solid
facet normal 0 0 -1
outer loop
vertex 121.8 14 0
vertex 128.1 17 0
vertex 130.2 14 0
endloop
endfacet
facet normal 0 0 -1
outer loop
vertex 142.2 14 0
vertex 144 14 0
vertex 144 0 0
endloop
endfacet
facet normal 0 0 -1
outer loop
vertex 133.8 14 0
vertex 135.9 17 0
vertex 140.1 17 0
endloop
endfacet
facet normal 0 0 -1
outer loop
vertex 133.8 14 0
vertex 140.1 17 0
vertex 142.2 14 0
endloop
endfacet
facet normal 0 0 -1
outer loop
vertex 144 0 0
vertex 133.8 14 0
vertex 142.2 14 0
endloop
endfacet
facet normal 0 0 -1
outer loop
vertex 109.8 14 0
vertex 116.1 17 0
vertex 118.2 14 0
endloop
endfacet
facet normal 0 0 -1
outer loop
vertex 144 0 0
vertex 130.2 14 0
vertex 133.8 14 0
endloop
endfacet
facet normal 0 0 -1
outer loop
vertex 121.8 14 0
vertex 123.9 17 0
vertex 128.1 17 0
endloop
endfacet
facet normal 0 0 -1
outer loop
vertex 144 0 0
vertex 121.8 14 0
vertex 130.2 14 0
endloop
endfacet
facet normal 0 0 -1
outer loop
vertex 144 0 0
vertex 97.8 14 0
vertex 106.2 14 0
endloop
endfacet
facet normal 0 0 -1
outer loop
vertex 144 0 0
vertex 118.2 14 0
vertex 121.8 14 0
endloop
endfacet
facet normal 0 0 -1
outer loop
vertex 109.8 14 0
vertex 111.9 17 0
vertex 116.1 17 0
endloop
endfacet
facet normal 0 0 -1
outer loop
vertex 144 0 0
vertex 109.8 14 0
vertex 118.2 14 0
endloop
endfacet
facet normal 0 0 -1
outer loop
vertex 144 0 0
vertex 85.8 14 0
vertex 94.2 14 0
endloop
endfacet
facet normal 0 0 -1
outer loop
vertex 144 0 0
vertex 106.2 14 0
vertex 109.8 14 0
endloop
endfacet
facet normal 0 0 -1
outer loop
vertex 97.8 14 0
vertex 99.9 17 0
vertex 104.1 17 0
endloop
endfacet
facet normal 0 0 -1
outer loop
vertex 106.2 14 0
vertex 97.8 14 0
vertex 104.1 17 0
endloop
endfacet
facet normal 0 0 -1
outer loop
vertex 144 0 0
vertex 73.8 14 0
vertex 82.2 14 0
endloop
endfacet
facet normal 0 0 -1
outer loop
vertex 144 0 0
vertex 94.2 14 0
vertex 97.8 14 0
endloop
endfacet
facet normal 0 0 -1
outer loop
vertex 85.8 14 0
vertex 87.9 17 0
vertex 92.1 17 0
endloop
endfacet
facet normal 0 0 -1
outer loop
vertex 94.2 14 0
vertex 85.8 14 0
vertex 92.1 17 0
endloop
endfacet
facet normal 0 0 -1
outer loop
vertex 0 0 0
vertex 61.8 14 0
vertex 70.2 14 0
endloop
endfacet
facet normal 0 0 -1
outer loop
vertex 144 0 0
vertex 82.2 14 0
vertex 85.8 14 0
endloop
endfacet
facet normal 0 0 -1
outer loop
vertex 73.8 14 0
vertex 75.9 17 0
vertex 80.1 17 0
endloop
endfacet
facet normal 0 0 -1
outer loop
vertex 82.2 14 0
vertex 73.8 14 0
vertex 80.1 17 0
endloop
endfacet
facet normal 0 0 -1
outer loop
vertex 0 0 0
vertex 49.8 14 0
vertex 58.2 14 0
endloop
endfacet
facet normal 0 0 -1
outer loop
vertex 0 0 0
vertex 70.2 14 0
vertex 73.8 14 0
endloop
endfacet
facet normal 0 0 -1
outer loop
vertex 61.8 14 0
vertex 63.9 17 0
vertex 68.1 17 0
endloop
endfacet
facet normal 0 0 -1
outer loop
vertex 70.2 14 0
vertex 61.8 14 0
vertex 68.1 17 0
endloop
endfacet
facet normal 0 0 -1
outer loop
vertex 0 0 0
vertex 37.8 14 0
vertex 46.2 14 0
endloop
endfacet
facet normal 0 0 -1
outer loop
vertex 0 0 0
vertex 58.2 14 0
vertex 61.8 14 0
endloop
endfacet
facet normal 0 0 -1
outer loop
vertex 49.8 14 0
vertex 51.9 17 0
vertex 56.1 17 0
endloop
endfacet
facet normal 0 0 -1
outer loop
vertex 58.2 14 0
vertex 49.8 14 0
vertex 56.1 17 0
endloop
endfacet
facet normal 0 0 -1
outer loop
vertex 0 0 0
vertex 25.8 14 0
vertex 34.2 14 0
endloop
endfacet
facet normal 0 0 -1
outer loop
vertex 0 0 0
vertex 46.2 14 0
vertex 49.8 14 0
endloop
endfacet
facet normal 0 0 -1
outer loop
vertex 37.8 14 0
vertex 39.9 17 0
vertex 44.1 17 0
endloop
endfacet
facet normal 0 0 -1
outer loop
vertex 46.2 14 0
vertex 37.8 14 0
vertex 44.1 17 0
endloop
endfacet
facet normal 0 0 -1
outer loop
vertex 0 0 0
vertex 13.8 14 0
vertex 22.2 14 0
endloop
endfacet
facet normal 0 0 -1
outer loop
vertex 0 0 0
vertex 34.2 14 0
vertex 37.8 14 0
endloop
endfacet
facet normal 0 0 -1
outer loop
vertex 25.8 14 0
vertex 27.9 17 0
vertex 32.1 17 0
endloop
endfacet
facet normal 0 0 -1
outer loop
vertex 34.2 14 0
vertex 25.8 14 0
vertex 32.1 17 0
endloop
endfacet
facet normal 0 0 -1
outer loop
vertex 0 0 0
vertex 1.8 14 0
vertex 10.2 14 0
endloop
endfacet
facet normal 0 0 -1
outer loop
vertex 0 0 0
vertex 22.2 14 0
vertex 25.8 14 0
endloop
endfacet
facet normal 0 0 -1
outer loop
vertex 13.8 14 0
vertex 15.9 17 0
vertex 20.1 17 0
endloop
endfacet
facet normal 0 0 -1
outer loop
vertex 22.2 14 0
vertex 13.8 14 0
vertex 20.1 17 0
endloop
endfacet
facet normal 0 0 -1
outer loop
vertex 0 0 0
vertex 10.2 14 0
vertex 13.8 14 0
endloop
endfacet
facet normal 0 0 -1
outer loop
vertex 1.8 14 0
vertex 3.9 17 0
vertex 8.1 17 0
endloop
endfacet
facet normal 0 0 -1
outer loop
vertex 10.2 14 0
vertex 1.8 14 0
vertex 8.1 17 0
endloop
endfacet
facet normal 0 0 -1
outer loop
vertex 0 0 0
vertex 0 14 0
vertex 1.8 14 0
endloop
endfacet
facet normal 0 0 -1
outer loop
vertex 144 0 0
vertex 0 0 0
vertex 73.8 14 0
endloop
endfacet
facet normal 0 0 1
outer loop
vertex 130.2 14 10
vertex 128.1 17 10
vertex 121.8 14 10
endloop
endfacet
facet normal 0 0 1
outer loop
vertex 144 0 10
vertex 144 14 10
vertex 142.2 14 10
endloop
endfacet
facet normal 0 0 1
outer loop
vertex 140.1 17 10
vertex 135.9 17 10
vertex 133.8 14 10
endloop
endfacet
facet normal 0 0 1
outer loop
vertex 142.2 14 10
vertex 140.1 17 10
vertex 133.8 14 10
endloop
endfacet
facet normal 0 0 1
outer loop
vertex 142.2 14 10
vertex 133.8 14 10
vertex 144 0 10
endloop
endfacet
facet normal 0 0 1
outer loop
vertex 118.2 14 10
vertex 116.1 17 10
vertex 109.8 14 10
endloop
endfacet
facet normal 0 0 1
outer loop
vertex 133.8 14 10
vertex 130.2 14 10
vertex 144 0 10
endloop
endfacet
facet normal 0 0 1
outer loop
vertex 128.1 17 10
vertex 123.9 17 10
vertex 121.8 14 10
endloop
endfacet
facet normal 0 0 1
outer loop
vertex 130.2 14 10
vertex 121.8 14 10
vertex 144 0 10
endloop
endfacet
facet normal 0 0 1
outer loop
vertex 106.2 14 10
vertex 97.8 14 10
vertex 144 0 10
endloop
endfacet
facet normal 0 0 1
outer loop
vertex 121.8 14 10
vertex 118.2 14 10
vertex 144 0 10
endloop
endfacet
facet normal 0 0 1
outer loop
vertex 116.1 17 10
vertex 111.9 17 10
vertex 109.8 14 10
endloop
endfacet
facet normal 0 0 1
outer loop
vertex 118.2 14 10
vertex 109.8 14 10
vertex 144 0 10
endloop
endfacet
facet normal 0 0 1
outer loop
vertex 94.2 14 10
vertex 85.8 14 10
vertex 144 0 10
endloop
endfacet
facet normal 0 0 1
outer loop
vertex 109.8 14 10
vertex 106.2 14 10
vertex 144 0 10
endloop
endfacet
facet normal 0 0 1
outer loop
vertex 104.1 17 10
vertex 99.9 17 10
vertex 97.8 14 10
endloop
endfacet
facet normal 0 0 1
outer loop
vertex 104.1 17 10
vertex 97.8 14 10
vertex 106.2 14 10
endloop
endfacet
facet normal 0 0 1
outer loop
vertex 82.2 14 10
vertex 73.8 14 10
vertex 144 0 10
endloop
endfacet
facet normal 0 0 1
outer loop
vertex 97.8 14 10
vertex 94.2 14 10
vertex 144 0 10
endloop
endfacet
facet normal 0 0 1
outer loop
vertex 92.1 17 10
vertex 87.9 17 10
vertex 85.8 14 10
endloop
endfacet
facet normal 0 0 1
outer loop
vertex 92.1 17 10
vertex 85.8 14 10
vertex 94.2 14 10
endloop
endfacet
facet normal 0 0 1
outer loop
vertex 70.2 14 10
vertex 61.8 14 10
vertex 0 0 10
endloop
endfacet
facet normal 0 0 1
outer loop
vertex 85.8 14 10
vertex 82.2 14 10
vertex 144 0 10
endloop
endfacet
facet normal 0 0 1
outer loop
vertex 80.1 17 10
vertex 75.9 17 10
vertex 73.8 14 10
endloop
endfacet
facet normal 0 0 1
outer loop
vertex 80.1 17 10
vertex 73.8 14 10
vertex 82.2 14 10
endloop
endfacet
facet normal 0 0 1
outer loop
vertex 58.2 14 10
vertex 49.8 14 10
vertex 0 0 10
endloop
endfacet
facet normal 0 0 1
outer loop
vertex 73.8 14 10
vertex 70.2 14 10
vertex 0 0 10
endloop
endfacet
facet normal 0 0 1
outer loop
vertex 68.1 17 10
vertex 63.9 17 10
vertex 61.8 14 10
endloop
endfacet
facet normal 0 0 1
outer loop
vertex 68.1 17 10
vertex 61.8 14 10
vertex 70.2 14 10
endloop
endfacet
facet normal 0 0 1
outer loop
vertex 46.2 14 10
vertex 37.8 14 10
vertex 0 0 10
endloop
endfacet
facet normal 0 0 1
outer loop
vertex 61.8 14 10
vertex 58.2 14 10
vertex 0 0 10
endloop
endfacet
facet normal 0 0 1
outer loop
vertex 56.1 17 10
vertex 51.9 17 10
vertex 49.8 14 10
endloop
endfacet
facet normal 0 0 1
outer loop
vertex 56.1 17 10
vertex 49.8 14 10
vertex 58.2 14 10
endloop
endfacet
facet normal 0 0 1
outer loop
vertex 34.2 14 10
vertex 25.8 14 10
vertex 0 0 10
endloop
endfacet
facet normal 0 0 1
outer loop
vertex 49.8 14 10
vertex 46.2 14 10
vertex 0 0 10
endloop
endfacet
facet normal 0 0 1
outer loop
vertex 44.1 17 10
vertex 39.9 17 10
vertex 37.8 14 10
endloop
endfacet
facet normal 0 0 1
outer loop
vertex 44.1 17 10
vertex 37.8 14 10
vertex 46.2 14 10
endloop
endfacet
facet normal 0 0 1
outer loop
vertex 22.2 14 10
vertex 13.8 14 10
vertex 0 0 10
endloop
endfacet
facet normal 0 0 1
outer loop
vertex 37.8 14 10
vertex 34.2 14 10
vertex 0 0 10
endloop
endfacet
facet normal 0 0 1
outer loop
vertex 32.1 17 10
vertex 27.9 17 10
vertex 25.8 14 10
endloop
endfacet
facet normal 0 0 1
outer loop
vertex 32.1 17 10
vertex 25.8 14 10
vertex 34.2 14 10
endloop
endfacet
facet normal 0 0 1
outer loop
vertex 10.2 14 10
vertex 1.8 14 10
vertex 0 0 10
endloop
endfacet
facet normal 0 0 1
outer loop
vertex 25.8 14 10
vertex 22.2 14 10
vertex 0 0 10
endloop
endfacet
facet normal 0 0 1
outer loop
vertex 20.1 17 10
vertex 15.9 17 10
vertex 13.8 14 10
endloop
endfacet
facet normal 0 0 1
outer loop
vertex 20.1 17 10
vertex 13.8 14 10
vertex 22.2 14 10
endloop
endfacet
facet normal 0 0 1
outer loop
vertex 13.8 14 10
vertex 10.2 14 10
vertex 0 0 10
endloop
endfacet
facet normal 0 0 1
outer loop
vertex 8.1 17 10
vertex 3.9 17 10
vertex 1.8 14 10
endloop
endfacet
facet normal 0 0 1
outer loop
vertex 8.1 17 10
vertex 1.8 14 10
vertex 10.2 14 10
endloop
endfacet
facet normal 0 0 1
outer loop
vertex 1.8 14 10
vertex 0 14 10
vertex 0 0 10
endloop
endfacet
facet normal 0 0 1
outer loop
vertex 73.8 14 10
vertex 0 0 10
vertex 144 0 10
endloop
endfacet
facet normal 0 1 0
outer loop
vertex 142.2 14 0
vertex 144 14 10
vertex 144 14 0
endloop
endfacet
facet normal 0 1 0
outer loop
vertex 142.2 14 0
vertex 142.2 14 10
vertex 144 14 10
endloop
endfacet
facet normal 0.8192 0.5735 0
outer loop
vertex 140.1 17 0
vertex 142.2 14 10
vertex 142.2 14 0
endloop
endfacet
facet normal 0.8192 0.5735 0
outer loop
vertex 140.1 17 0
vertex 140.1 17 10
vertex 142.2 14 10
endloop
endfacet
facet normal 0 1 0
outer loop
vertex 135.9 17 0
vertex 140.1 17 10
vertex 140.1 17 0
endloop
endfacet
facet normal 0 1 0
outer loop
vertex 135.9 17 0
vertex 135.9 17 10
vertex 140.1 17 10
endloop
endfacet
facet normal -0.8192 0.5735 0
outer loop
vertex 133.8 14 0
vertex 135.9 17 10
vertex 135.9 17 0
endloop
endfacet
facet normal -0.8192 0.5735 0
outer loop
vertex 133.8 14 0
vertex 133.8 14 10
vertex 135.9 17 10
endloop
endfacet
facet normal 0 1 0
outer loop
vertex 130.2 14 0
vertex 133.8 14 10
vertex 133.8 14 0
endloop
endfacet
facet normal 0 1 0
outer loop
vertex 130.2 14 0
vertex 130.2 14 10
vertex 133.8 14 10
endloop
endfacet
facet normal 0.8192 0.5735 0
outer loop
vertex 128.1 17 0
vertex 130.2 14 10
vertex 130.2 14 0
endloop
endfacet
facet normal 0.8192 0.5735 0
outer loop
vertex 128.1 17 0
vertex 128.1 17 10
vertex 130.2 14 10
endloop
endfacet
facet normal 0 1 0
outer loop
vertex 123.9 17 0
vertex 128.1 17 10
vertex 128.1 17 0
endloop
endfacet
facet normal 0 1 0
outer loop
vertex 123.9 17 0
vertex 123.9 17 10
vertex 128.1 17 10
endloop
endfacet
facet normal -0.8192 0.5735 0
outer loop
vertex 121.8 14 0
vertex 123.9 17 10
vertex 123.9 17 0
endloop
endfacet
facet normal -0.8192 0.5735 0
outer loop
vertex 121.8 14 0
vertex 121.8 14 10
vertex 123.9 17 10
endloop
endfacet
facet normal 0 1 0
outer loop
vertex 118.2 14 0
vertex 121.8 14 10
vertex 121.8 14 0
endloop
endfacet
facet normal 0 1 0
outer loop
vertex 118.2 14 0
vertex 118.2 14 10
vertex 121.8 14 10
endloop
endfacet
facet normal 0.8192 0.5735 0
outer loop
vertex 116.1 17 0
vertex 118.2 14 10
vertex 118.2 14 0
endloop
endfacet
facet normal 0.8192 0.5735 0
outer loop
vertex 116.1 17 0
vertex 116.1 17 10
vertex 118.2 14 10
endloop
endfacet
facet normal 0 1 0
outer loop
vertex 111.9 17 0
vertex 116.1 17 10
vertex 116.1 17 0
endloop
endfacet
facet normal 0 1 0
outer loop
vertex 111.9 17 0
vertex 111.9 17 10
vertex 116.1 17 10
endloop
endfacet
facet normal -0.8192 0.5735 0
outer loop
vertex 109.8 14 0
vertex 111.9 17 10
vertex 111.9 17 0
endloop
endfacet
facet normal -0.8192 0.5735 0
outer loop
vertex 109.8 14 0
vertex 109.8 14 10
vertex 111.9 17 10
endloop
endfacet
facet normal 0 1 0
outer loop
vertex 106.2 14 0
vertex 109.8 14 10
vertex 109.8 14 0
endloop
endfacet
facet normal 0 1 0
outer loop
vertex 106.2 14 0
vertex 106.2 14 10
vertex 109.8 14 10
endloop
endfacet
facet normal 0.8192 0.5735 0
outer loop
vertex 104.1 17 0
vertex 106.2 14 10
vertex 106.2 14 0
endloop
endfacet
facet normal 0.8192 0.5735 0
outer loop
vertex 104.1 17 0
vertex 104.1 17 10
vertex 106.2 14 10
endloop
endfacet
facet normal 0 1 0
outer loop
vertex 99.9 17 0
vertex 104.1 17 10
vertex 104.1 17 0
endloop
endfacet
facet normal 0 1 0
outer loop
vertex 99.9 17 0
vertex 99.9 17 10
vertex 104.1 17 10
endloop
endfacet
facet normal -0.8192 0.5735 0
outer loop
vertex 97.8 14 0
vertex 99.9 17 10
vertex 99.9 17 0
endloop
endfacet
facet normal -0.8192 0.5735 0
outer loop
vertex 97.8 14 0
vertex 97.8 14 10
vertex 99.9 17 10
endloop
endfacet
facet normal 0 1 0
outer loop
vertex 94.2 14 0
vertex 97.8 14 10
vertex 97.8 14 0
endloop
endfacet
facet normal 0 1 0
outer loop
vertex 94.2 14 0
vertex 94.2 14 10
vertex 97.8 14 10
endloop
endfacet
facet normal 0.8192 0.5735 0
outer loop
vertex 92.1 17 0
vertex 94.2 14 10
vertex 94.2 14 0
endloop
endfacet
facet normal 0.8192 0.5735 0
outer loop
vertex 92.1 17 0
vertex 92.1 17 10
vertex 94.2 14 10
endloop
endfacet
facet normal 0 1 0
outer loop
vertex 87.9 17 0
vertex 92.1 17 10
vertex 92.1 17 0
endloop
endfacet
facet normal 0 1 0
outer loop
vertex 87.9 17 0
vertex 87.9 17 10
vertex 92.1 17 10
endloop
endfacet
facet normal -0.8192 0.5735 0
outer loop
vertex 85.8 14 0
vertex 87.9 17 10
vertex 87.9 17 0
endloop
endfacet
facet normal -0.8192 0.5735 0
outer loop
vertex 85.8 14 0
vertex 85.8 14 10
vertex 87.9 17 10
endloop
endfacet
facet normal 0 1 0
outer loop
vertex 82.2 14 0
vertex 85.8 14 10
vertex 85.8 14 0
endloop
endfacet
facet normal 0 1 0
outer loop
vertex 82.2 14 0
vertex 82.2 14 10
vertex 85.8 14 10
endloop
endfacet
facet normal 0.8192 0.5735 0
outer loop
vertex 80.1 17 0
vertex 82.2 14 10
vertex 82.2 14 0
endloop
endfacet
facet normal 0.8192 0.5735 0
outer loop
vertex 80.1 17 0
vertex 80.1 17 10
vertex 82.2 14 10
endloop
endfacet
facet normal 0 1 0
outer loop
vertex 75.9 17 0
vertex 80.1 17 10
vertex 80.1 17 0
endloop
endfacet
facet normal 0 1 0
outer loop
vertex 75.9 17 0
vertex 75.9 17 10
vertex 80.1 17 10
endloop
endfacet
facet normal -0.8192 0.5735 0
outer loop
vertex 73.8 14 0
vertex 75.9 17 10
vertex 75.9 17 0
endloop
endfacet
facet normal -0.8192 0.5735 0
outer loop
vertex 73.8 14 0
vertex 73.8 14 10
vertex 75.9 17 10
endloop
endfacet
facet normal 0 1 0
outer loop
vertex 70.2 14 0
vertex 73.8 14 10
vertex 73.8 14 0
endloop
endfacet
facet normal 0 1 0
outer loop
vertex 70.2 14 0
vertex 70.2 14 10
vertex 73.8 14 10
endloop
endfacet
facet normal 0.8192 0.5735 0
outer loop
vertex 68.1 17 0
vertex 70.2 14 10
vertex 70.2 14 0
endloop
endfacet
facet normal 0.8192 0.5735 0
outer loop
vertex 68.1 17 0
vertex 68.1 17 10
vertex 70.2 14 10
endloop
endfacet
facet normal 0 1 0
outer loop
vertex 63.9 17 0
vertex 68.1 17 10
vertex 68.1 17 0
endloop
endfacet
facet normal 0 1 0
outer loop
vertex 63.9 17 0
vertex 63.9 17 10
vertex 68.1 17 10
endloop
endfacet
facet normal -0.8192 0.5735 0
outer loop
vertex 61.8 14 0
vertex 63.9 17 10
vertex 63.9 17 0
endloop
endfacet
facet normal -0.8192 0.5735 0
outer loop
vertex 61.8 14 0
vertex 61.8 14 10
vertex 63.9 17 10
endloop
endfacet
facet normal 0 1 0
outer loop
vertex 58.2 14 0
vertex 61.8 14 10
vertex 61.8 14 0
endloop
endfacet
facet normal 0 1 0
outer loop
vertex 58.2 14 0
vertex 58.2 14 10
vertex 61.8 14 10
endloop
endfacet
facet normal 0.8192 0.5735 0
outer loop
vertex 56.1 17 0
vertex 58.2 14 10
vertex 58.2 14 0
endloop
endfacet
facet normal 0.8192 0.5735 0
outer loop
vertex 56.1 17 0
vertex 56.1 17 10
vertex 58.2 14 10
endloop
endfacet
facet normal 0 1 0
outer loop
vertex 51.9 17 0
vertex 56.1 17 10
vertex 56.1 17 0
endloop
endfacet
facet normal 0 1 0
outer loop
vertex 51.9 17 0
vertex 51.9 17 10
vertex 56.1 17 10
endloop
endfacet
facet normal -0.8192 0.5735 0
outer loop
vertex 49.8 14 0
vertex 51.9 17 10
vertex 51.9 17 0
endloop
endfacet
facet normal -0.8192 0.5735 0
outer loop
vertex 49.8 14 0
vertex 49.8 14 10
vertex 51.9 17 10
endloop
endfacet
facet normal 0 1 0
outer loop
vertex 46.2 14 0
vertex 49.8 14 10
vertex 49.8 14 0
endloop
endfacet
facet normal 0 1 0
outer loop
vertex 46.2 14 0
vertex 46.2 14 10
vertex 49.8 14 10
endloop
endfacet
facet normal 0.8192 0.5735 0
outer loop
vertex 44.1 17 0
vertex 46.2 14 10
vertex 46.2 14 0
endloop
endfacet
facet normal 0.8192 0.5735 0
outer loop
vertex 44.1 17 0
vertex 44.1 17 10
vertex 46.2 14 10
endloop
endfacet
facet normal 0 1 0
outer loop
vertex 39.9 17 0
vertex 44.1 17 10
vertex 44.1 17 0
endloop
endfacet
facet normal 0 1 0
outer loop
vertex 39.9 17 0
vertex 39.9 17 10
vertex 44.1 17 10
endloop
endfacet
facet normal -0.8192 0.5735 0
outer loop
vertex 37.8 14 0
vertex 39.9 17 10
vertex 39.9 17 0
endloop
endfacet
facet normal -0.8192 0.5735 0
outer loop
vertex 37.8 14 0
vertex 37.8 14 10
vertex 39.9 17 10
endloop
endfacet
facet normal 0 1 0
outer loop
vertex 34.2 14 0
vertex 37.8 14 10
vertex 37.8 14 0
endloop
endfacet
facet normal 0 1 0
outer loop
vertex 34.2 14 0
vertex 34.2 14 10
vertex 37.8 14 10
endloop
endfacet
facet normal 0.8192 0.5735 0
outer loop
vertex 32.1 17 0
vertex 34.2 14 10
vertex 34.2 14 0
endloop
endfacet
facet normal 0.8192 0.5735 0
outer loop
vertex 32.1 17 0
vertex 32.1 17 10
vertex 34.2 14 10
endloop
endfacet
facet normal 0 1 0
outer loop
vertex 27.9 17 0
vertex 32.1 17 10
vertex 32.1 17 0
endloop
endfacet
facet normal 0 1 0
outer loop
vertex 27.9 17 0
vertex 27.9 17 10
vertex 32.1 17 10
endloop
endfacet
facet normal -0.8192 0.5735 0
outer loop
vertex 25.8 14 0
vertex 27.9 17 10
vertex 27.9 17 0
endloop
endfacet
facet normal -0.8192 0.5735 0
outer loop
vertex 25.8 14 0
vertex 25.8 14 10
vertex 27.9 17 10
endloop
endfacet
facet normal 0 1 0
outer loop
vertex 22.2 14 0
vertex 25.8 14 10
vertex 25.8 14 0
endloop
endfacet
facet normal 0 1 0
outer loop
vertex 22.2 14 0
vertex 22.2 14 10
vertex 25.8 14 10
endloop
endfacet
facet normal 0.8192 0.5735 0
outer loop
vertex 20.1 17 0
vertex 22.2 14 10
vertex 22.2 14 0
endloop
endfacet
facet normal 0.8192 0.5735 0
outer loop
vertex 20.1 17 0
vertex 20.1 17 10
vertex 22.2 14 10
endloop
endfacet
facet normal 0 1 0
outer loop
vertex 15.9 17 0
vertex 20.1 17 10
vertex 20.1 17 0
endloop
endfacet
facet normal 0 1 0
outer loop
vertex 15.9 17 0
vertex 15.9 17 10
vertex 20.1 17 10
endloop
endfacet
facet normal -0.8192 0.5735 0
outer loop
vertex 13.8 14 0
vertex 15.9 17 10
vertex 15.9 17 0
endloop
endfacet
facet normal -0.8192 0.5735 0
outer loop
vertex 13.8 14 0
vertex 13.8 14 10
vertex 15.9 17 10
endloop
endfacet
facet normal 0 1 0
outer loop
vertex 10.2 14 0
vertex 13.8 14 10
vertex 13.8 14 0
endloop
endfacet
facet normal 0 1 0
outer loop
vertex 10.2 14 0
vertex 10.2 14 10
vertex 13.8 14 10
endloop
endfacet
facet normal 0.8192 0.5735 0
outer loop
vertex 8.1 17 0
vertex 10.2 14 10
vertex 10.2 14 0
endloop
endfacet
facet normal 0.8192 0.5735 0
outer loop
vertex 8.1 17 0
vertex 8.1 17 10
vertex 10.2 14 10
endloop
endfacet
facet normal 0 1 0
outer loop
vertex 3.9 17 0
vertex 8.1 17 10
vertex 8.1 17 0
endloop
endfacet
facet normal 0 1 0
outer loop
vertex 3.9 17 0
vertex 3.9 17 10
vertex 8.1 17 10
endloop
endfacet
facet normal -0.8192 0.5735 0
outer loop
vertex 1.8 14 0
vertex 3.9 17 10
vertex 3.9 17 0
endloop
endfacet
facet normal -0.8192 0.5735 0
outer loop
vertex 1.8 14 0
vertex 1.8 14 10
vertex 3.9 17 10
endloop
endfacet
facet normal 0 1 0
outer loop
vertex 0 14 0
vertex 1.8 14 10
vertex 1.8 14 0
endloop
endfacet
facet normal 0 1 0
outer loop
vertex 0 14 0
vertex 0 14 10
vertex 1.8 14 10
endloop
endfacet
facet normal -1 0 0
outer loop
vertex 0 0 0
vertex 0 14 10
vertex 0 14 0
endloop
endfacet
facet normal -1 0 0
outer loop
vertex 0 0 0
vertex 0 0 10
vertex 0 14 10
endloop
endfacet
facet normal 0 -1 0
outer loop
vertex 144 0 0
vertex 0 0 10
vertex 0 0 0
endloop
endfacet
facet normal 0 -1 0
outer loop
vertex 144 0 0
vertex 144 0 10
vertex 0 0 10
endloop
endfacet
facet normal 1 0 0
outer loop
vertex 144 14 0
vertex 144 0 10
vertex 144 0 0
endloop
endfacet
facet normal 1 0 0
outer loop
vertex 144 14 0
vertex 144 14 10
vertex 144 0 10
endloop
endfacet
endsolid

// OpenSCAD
$fn = 32;

// ----------------------------------------------------------------------
// Gear rack: 12 teeth, pitch 12 mm
// ----------------------------------------------------------------------

// --- parameters (mm) ---
teeth = 12;               // number of teeth
pitch = 12;               // tooth pitch, X
root_w = 8.4;             // tooth width at the root
tip_w = 4.2;              // tooth width at the tip
base_h = 14;              // rack body height, Y
tooth_h = 3;              // tooth height above the body
plate_t = 10;             // rack width, Z (extrusion height)

rack_l = teeth * pitch;  // overall length
total_h = base_h + tooth_h;  // overall height

profile = [[0, 0], [144, 0], [144, 14], [142.2, 14], [140.1, 17], [135.9, 17], [133.8, 14], [130.2, 14], [128.1, 17], [123.9, 17], [121.8, 14], [118.2, 14], [116.1, 17], [111.9, 17], [109.8, 14], [106.2, 14], [104.1, 17], [99.9, 17], [97.8, 14], [94.2, 14], [92.1, 17], [87.9, 17], [85.8, 14], [82.2, 14], [80.1, 17], [75.9, 17], [73.8, 14], [70.2, 14], [68.1, 17], [63.9, 17], [61.8, 14], [58.2, 14], [56.1, 17], [51.9, 17], [49.8, 14], [46.2, 14], [44.1, 17], [39.9, 17], [37.8, 14], [34.2, 14], [32.1, 17], [27.9, 17], [25.8, 14], [22.2, 14], [20.1, 17], [15.9, 17], [13.8, 14], [10.2, 14], [8.1, 17], [3.9, 17], [1.8, 14], [0, 14]];  // primary outline, 52 points, counter clockwise

// --- the one profile operation ---
linear_extrude(height = plate_t) polygon(points = profile);
